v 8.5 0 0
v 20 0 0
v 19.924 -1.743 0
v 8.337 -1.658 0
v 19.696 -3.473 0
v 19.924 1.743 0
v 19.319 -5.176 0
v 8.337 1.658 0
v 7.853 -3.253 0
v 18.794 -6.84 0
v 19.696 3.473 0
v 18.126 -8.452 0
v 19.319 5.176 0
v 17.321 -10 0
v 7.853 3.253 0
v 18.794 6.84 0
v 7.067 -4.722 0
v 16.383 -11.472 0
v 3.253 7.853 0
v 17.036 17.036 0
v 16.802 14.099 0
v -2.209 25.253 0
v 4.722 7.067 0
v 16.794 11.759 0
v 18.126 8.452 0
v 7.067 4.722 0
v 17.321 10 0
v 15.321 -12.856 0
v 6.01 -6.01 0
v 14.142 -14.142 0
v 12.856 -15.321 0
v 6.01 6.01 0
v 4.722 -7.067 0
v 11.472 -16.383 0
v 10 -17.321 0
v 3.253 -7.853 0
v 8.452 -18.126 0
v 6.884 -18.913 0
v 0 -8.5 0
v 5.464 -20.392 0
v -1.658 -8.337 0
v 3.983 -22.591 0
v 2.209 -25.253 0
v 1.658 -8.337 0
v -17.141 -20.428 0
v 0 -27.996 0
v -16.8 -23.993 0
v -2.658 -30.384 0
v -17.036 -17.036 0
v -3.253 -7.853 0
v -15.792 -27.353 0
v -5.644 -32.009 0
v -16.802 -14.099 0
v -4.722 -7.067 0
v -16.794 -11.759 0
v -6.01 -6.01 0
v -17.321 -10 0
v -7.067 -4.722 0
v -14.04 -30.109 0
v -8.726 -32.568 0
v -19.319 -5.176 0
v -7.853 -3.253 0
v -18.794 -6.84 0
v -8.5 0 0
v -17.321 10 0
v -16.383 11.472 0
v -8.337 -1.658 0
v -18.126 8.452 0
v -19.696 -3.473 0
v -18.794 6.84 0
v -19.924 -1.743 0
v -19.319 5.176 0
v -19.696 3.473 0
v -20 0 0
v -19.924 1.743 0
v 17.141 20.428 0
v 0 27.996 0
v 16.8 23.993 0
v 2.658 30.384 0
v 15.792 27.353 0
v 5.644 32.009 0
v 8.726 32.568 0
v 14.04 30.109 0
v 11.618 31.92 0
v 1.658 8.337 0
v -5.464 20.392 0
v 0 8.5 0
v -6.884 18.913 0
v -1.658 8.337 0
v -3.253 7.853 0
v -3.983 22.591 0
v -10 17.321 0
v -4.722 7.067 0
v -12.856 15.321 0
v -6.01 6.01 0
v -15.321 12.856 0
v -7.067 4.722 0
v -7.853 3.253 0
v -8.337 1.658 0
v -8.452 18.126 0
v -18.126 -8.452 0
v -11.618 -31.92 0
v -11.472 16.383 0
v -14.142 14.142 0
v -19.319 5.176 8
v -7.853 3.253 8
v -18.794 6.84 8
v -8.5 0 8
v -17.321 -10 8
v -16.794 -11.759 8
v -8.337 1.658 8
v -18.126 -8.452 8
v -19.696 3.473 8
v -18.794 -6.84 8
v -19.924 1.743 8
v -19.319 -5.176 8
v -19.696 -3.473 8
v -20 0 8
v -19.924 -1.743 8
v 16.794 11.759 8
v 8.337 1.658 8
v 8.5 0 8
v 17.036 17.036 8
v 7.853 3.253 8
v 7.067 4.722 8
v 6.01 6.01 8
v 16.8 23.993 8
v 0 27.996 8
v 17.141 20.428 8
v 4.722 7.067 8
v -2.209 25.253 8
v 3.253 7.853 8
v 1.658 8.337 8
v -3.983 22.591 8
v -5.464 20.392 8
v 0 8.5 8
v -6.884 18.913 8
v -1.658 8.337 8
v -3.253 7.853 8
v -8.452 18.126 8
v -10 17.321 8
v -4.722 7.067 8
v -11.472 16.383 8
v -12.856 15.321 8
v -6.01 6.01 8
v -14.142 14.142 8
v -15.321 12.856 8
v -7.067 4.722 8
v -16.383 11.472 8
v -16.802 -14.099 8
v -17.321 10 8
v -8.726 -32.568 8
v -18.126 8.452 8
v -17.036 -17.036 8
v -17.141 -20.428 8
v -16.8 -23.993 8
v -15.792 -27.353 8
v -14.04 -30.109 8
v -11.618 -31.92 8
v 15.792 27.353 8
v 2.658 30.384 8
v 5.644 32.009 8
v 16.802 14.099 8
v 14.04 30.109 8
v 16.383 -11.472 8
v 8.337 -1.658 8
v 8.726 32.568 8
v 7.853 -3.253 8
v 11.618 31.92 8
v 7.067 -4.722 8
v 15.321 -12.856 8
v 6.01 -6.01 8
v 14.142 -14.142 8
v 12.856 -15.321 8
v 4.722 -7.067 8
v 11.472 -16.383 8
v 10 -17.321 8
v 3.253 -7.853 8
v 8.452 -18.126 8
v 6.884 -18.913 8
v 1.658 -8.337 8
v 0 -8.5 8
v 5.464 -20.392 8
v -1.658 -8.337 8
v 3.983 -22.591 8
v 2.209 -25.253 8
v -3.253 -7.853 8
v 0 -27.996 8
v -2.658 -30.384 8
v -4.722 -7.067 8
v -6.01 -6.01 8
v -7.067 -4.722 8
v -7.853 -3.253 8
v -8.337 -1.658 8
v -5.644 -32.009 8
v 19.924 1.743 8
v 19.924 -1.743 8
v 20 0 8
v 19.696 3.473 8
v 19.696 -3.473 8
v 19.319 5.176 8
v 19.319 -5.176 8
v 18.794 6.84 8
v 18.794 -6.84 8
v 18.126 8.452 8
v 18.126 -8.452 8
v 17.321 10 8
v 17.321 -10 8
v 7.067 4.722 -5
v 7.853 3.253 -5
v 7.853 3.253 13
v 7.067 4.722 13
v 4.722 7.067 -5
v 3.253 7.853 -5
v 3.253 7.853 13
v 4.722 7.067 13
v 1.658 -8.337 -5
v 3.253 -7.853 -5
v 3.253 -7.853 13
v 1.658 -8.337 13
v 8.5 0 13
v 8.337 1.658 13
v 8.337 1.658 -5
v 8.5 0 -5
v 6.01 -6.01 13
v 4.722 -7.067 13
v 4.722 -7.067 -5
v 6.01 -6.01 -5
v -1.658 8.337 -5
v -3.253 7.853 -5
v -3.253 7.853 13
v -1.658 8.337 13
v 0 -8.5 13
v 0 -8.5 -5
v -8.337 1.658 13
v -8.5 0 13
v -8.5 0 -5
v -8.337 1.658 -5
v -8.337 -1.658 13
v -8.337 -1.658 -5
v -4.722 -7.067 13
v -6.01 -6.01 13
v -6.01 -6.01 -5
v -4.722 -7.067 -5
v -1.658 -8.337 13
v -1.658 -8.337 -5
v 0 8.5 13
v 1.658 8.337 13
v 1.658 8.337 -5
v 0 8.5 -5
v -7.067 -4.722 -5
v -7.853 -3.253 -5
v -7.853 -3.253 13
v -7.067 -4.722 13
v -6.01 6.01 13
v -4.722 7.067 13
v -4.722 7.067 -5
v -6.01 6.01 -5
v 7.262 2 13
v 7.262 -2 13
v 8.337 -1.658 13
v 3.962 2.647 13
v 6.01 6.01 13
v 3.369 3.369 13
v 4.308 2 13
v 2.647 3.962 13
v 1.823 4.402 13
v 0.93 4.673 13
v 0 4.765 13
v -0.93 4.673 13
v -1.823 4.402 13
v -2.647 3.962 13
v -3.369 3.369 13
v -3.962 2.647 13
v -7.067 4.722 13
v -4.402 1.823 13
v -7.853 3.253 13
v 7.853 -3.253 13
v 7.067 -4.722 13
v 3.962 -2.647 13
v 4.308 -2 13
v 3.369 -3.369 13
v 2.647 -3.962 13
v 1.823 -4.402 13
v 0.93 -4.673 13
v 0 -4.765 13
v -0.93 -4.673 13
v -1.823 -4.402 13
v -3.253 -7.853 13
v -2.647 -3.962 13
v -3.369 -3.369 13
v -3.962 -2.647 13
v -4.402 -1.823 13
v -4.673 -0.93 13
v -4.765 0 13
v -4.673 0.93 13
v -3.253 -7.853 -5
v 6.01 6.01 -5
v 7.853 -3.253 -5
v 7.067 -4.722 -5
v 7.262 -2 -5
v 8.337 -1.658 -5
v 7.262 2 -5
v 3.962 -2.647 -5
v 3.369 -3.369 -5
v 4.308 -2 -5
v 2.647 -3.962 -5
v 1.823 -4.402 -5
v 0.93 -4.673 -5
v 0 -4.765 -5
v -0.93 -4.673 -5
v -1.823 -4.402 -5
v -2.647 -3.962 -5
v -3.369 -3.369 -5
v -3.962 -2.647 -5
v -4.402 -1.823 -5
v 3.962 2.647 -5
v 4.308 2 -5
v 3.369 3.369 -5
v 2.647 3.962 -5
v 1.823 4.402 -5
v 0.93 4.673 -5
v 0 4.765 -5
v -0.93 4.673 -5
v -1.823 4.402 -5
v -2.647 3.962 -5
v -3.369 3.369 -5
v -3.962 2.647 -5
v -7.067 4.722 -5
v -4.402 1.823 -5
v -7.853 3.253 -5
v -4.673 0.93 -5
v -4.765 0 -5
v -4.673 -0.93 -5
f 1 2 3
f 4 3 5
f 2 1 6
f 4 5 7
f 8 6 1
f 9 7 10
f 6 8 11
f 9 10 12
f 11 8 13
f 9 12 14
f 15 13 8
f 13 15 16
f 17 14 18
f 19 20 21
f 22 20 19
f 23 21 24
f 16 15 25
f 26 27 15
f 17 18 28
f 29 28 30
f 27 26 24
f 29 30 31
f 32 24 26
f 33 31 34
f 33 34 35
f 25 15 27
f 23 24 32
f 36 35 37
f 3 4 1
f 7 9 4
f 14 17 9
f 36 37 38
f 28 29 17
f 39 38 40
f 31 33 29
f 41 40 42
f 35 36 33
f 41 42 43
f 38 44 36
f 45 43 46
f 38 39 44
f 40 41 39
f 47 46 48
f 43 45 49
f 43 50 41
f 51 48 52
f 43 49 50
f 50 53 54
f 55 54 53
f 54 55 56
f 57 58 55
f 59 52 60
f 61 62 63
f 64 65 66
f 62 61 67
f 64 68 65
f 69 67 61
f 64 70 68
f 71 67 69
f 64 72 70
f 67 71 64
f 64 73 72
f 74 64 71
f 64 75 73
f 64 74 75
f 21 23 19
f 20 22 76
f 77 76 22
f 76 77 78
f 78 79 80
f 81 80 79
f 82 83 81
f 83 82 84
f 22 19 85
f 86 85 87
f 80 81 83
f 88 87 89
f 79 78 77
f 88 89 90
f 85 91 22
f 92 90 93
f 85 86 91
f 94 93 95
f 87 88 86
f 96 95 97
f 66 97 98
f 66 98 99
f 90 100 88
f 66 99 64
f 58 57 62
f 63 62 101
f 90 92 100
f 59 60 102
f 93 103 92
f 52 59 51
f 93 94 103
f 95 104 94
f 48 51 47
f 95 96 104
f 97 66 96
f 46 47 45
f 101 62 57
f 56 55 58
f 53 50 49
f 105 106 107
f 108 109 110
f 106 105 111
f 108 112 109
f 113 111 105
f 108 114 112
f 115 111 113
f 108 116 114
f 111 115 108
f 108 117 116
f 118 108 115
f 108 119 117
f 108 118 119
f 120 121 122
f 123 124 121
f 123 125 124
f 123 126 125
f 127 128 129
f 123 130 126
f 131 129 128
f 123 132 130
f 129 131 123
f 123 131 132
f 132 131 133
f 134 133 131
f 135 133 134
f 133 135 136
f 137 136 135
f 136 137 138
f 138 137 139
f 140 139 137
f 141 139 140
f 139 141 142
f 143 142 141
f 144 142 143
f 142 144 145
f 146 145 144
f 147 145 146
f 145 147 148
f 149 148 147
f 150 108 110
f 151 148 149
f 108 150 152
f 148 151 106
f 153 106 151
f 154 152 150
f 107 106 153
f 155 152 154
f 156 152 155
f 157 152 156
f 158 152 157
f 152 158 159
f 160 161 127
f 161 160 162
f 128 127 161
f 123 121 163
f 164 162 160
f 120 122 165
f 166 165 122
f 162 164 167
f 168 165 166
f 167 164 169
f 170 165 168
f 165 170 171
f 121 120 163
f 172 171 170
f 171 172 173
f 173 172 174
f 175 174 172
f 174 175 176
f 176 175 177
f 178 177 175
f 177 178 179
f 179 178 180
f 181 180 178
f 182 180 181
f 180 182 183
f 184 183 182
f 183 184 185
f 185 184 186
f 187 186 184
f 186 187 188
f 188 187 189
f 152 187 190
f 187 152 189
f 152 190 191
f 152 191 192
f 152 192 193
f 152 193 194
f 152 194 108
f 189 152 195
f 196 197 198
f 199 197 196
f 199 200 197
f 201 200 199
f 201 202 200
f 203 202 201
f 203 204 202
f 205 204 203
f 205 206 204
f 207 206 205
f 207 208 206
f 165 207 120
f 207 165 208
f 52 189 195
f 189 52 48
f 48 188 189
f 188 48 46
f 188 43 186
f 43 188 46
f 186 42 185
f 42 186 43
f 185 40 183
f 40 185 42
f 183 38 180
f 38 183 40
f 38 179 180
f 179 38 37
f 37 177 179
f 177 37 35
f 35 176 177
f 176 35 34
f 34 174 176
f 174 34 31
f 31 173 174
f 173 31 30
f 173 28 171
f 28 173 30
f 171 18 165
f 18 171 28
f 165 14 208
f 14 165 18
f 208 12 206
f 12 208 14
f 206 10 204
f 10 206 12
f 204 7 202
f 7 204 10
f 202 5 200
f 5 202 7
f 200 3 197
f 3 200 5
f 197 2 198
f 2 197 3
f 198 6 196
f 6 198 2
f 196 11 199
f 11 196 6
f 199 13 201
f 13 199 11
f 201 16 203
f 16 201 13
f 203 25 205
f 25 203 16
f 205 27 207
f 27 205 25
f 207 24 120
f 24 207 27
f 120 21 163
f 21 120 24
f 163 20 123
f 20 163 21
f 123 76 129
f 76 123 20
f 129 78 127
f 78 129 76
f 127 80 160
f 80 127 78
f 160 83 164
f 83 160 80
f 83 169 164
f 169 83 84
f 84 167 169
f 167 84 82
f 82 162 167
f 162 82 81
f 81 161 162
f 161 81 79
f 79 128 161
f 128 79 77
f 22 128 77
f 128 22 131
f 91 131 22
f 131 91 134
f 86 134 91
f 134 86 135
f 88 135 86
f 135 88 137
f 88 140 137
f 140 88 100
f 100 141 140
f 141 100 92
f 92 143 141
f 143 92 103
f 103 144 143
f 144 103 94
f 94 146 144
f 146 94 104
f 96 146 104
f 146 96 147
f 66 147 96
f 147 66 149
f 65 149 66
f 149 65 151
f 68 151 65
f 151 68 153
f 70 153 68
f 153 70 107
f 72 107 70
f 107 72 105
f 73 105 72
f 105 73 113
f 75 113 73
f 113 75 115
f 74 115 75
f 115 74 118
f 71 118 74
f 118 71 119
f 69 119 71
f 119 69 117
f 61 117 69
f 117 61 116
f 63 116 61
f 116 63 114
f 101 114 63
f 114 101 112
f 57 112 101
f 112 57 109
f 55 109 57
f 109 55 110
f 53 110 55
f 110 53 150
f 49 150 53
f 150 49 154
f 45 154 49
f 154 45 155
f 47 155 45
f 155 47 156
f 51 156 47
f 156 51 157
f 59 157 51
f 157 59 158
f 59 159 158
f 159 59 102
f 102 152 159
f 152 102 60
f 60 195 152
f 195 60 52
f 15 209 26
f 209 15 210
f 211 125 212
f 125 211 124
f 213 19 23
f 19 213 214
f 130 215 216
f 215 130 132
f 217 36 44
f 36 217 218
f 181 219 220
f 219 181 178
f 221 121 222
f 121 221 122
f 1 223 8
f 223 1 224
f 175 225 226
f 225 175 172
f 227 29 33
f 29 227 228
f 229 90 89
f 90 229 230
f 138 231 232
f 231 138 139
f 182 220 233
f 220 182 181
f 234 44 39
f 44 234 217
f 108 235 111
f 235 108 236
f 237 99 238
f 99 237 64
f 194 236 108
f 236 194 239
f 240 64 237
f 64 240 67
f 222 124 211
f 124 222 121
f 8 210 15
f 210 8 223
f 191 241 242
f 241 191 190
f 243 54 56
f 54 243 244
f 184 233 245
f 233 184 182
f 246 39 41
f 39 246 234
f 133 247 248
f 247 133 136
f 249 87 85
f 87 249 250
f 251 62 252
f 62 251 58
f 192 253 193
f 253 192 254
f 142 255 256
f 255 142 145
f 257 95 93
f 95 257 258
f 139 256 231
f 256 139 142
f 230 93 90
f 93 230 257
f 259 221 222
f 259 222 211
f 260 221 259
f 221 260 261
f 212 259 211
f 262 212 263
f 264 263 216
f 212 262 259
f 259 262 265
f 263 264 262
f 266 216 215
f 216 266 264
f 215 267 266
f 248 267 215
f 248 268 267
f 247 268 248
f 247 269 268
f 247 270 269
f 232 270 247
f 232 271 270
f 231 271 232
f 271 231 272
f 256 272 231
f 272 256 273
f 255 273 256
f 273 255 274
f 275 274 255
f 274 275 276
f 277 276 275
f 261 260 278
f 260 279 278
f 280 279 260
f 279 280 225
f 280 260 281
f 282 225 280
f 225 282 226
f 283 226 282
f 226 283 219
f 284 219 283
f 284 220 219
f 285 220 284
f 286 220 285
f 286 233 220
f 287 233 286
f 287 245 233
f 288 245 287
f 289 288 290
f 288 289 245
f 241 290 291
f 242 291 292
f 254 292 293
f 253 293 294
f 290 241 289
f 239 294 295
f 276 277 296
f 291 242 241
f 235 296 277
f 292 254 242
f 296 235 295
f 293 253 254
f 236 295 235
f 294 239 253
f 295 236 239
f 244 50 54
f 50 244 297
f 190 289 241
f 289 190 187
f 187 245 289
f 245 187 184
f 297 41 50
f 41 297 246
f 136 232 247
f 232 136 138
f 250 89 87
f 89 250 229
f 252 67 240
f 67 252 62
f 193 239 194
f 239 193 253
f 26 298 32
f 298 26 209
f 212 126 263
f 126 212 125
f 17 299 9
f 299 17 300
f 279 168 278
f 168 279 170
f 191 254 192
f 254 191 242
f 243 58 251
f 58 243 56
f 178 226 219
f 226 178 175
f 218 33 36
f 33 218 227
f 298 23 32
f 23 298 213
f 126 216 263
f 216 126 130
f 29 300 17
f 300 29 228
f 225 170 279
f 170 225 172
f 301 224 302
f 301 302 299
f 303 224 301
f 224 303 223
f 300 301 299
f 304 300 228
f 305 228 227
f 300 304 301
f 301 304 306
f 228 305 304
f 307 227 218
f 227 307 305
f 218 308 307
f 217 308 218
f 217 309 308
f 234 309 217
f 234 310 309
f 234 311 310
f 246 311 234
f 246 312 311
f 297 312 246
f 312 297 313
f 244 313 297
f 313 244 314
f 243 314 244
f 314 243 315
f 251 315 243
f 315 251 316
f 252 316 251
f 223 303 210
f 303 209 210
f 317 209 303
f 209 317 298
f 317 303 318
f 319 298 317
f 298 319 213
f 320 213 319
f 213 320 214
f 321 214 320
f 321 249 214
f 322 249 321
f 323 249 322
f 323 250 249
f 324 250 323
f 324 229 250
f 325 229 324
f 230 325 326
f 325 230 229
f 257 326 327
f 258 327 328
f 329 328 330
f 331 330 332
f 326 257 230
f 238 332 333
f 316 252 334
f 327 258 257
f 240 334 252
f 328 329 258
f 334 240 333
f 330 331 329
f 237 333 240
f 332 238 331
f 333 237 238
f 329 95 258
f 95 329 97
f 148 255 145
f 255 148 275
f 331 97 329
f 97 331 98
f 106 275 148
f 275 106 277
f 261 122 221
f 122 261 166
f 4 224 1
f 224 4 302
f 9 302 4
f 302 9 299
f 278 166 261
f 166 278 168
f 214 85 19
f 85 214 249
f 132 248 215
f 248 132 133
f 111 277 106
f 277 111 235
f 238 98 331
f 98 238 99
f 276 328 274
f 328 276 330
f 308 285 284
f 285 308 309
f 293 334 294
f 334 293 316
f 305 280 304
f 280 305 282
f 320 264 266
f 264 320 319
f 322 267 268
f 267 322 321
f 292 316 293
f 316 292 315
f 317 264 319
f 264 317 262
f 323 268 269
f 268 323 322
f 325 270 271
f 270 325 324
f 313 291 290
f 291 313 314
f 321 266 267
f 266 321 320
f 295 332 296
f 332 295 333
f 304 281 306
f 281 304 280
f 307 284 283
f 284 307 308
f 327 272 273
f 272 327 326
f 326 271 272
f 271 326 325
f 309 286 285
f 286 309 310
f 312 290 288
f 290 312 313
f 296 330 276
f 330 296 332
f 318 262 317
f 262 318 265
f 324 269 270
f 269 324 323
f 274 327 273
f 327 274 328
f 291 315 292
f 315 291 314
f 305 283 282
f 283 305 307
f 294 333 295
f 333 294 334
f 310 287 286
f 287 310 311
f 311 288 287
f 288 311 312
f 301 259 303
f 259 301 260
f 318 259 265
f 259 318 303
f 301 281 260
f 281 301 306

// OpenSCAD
$fn = 32;

// ----------------------------------------------------------------------
// Cam: base radius 20 mm with a 14 mm lift over 150 degrees
// ----------------------------------------------------------------------

// --- parameters (mm) ---
base_r = 20;              // base radius
lift = 14;                // lift height above the base radius
lift_span = 150;          // angular width of the lift
lift_start = 30;          // angle where the lift starts
cam_t = 8;                // cam plate thickness
hub_d = 17;               // hub diameter
hub_h = 18;               // hub height
bore_d = 9.53;            // bore
key_w = 4;                // keyway width
key_depth = 1.74;         // keyway depth

cam_profile = [[20, 0], [19.924, 1.743], [19.696, 3.473], [19.319, 5.176], [18.794, 6.84], [18.126, 8.452], [17.321, 10], [16.794, 11.759], [16.802, 14.099], [17.036, 17.036], [17.141, 20.428], [16.8, 23.993], [15.792, 27.353], [14.04, 30.109], [11.618, 31.92], [8.726, 32.568], [5.644, 32.009], [2.658, 30.384], [0, 27.996], [-2.209, 25.253], [-3.983, 22.591], [-5.464, 20.392], [-6.884, 18.913], [-8.452, 18.126], [-10, 17.321], [-11.472, 16.383], [-12.856, 15.321], [-14.142, 14.142], [-15.321, 12.856], [-16.383, 11.472], [-17.321, 10], [-18.126, 8.452], [-18.794, 6.84], [-19.319, 5.176], [-19.696, 3.473], [-19.924, 1.743], [-20, 0], [-19.924, -1.743], [-19.696, -3.473], [-19.319, -5.176], [-18.794, -6.84], [-18.126, -8.452], [-17.321, -10], [-16.794, -11.759], [-16.802, -14.099], [-17.036, -17.036], [-17.141, -20.428], [-16.8, -23.993], [-15.792, -27.353], [-14.04, -30.109], [-11.618, -31.92], [-8.726, -32.568], [-5.644, -32.009], [-2.658, -30.384], [0, -27.996], [2.209, -25.253], [3.983, -22.591], [5.464, -20.392], [6.884, -18.913], [8.452, -18.126], [10, -17.321], [11.472, -16.383], [12.856, -15.321], [14.142, -14.142], [15.321, -12.856], [16.383, -11.472], [17.321, -10], [18.126, -8.452], [18.794, -6.84], [19.319, -5.176], [19.696, -3.473], [19.924, -1.743]];

difference() {
  union() {
    linear_extrude(height = cam_t) polygon(cam_profile);
    /* hub, proud of the cam plate on both sides */
    translate([0, 0, -5]) cylinder(h = hub_h, d = hub_d);
  }
  /* bore through the hub, 2.5 mm clear on both faces */
  translate([0, 0, -7.5]) cylinder(h = hub_h + 5, d = bore_d);
  /* keyway, milled through the whole hub */
  translate([3.022, -2, -7.5]) cube([4.24, 4, 23]);
}
